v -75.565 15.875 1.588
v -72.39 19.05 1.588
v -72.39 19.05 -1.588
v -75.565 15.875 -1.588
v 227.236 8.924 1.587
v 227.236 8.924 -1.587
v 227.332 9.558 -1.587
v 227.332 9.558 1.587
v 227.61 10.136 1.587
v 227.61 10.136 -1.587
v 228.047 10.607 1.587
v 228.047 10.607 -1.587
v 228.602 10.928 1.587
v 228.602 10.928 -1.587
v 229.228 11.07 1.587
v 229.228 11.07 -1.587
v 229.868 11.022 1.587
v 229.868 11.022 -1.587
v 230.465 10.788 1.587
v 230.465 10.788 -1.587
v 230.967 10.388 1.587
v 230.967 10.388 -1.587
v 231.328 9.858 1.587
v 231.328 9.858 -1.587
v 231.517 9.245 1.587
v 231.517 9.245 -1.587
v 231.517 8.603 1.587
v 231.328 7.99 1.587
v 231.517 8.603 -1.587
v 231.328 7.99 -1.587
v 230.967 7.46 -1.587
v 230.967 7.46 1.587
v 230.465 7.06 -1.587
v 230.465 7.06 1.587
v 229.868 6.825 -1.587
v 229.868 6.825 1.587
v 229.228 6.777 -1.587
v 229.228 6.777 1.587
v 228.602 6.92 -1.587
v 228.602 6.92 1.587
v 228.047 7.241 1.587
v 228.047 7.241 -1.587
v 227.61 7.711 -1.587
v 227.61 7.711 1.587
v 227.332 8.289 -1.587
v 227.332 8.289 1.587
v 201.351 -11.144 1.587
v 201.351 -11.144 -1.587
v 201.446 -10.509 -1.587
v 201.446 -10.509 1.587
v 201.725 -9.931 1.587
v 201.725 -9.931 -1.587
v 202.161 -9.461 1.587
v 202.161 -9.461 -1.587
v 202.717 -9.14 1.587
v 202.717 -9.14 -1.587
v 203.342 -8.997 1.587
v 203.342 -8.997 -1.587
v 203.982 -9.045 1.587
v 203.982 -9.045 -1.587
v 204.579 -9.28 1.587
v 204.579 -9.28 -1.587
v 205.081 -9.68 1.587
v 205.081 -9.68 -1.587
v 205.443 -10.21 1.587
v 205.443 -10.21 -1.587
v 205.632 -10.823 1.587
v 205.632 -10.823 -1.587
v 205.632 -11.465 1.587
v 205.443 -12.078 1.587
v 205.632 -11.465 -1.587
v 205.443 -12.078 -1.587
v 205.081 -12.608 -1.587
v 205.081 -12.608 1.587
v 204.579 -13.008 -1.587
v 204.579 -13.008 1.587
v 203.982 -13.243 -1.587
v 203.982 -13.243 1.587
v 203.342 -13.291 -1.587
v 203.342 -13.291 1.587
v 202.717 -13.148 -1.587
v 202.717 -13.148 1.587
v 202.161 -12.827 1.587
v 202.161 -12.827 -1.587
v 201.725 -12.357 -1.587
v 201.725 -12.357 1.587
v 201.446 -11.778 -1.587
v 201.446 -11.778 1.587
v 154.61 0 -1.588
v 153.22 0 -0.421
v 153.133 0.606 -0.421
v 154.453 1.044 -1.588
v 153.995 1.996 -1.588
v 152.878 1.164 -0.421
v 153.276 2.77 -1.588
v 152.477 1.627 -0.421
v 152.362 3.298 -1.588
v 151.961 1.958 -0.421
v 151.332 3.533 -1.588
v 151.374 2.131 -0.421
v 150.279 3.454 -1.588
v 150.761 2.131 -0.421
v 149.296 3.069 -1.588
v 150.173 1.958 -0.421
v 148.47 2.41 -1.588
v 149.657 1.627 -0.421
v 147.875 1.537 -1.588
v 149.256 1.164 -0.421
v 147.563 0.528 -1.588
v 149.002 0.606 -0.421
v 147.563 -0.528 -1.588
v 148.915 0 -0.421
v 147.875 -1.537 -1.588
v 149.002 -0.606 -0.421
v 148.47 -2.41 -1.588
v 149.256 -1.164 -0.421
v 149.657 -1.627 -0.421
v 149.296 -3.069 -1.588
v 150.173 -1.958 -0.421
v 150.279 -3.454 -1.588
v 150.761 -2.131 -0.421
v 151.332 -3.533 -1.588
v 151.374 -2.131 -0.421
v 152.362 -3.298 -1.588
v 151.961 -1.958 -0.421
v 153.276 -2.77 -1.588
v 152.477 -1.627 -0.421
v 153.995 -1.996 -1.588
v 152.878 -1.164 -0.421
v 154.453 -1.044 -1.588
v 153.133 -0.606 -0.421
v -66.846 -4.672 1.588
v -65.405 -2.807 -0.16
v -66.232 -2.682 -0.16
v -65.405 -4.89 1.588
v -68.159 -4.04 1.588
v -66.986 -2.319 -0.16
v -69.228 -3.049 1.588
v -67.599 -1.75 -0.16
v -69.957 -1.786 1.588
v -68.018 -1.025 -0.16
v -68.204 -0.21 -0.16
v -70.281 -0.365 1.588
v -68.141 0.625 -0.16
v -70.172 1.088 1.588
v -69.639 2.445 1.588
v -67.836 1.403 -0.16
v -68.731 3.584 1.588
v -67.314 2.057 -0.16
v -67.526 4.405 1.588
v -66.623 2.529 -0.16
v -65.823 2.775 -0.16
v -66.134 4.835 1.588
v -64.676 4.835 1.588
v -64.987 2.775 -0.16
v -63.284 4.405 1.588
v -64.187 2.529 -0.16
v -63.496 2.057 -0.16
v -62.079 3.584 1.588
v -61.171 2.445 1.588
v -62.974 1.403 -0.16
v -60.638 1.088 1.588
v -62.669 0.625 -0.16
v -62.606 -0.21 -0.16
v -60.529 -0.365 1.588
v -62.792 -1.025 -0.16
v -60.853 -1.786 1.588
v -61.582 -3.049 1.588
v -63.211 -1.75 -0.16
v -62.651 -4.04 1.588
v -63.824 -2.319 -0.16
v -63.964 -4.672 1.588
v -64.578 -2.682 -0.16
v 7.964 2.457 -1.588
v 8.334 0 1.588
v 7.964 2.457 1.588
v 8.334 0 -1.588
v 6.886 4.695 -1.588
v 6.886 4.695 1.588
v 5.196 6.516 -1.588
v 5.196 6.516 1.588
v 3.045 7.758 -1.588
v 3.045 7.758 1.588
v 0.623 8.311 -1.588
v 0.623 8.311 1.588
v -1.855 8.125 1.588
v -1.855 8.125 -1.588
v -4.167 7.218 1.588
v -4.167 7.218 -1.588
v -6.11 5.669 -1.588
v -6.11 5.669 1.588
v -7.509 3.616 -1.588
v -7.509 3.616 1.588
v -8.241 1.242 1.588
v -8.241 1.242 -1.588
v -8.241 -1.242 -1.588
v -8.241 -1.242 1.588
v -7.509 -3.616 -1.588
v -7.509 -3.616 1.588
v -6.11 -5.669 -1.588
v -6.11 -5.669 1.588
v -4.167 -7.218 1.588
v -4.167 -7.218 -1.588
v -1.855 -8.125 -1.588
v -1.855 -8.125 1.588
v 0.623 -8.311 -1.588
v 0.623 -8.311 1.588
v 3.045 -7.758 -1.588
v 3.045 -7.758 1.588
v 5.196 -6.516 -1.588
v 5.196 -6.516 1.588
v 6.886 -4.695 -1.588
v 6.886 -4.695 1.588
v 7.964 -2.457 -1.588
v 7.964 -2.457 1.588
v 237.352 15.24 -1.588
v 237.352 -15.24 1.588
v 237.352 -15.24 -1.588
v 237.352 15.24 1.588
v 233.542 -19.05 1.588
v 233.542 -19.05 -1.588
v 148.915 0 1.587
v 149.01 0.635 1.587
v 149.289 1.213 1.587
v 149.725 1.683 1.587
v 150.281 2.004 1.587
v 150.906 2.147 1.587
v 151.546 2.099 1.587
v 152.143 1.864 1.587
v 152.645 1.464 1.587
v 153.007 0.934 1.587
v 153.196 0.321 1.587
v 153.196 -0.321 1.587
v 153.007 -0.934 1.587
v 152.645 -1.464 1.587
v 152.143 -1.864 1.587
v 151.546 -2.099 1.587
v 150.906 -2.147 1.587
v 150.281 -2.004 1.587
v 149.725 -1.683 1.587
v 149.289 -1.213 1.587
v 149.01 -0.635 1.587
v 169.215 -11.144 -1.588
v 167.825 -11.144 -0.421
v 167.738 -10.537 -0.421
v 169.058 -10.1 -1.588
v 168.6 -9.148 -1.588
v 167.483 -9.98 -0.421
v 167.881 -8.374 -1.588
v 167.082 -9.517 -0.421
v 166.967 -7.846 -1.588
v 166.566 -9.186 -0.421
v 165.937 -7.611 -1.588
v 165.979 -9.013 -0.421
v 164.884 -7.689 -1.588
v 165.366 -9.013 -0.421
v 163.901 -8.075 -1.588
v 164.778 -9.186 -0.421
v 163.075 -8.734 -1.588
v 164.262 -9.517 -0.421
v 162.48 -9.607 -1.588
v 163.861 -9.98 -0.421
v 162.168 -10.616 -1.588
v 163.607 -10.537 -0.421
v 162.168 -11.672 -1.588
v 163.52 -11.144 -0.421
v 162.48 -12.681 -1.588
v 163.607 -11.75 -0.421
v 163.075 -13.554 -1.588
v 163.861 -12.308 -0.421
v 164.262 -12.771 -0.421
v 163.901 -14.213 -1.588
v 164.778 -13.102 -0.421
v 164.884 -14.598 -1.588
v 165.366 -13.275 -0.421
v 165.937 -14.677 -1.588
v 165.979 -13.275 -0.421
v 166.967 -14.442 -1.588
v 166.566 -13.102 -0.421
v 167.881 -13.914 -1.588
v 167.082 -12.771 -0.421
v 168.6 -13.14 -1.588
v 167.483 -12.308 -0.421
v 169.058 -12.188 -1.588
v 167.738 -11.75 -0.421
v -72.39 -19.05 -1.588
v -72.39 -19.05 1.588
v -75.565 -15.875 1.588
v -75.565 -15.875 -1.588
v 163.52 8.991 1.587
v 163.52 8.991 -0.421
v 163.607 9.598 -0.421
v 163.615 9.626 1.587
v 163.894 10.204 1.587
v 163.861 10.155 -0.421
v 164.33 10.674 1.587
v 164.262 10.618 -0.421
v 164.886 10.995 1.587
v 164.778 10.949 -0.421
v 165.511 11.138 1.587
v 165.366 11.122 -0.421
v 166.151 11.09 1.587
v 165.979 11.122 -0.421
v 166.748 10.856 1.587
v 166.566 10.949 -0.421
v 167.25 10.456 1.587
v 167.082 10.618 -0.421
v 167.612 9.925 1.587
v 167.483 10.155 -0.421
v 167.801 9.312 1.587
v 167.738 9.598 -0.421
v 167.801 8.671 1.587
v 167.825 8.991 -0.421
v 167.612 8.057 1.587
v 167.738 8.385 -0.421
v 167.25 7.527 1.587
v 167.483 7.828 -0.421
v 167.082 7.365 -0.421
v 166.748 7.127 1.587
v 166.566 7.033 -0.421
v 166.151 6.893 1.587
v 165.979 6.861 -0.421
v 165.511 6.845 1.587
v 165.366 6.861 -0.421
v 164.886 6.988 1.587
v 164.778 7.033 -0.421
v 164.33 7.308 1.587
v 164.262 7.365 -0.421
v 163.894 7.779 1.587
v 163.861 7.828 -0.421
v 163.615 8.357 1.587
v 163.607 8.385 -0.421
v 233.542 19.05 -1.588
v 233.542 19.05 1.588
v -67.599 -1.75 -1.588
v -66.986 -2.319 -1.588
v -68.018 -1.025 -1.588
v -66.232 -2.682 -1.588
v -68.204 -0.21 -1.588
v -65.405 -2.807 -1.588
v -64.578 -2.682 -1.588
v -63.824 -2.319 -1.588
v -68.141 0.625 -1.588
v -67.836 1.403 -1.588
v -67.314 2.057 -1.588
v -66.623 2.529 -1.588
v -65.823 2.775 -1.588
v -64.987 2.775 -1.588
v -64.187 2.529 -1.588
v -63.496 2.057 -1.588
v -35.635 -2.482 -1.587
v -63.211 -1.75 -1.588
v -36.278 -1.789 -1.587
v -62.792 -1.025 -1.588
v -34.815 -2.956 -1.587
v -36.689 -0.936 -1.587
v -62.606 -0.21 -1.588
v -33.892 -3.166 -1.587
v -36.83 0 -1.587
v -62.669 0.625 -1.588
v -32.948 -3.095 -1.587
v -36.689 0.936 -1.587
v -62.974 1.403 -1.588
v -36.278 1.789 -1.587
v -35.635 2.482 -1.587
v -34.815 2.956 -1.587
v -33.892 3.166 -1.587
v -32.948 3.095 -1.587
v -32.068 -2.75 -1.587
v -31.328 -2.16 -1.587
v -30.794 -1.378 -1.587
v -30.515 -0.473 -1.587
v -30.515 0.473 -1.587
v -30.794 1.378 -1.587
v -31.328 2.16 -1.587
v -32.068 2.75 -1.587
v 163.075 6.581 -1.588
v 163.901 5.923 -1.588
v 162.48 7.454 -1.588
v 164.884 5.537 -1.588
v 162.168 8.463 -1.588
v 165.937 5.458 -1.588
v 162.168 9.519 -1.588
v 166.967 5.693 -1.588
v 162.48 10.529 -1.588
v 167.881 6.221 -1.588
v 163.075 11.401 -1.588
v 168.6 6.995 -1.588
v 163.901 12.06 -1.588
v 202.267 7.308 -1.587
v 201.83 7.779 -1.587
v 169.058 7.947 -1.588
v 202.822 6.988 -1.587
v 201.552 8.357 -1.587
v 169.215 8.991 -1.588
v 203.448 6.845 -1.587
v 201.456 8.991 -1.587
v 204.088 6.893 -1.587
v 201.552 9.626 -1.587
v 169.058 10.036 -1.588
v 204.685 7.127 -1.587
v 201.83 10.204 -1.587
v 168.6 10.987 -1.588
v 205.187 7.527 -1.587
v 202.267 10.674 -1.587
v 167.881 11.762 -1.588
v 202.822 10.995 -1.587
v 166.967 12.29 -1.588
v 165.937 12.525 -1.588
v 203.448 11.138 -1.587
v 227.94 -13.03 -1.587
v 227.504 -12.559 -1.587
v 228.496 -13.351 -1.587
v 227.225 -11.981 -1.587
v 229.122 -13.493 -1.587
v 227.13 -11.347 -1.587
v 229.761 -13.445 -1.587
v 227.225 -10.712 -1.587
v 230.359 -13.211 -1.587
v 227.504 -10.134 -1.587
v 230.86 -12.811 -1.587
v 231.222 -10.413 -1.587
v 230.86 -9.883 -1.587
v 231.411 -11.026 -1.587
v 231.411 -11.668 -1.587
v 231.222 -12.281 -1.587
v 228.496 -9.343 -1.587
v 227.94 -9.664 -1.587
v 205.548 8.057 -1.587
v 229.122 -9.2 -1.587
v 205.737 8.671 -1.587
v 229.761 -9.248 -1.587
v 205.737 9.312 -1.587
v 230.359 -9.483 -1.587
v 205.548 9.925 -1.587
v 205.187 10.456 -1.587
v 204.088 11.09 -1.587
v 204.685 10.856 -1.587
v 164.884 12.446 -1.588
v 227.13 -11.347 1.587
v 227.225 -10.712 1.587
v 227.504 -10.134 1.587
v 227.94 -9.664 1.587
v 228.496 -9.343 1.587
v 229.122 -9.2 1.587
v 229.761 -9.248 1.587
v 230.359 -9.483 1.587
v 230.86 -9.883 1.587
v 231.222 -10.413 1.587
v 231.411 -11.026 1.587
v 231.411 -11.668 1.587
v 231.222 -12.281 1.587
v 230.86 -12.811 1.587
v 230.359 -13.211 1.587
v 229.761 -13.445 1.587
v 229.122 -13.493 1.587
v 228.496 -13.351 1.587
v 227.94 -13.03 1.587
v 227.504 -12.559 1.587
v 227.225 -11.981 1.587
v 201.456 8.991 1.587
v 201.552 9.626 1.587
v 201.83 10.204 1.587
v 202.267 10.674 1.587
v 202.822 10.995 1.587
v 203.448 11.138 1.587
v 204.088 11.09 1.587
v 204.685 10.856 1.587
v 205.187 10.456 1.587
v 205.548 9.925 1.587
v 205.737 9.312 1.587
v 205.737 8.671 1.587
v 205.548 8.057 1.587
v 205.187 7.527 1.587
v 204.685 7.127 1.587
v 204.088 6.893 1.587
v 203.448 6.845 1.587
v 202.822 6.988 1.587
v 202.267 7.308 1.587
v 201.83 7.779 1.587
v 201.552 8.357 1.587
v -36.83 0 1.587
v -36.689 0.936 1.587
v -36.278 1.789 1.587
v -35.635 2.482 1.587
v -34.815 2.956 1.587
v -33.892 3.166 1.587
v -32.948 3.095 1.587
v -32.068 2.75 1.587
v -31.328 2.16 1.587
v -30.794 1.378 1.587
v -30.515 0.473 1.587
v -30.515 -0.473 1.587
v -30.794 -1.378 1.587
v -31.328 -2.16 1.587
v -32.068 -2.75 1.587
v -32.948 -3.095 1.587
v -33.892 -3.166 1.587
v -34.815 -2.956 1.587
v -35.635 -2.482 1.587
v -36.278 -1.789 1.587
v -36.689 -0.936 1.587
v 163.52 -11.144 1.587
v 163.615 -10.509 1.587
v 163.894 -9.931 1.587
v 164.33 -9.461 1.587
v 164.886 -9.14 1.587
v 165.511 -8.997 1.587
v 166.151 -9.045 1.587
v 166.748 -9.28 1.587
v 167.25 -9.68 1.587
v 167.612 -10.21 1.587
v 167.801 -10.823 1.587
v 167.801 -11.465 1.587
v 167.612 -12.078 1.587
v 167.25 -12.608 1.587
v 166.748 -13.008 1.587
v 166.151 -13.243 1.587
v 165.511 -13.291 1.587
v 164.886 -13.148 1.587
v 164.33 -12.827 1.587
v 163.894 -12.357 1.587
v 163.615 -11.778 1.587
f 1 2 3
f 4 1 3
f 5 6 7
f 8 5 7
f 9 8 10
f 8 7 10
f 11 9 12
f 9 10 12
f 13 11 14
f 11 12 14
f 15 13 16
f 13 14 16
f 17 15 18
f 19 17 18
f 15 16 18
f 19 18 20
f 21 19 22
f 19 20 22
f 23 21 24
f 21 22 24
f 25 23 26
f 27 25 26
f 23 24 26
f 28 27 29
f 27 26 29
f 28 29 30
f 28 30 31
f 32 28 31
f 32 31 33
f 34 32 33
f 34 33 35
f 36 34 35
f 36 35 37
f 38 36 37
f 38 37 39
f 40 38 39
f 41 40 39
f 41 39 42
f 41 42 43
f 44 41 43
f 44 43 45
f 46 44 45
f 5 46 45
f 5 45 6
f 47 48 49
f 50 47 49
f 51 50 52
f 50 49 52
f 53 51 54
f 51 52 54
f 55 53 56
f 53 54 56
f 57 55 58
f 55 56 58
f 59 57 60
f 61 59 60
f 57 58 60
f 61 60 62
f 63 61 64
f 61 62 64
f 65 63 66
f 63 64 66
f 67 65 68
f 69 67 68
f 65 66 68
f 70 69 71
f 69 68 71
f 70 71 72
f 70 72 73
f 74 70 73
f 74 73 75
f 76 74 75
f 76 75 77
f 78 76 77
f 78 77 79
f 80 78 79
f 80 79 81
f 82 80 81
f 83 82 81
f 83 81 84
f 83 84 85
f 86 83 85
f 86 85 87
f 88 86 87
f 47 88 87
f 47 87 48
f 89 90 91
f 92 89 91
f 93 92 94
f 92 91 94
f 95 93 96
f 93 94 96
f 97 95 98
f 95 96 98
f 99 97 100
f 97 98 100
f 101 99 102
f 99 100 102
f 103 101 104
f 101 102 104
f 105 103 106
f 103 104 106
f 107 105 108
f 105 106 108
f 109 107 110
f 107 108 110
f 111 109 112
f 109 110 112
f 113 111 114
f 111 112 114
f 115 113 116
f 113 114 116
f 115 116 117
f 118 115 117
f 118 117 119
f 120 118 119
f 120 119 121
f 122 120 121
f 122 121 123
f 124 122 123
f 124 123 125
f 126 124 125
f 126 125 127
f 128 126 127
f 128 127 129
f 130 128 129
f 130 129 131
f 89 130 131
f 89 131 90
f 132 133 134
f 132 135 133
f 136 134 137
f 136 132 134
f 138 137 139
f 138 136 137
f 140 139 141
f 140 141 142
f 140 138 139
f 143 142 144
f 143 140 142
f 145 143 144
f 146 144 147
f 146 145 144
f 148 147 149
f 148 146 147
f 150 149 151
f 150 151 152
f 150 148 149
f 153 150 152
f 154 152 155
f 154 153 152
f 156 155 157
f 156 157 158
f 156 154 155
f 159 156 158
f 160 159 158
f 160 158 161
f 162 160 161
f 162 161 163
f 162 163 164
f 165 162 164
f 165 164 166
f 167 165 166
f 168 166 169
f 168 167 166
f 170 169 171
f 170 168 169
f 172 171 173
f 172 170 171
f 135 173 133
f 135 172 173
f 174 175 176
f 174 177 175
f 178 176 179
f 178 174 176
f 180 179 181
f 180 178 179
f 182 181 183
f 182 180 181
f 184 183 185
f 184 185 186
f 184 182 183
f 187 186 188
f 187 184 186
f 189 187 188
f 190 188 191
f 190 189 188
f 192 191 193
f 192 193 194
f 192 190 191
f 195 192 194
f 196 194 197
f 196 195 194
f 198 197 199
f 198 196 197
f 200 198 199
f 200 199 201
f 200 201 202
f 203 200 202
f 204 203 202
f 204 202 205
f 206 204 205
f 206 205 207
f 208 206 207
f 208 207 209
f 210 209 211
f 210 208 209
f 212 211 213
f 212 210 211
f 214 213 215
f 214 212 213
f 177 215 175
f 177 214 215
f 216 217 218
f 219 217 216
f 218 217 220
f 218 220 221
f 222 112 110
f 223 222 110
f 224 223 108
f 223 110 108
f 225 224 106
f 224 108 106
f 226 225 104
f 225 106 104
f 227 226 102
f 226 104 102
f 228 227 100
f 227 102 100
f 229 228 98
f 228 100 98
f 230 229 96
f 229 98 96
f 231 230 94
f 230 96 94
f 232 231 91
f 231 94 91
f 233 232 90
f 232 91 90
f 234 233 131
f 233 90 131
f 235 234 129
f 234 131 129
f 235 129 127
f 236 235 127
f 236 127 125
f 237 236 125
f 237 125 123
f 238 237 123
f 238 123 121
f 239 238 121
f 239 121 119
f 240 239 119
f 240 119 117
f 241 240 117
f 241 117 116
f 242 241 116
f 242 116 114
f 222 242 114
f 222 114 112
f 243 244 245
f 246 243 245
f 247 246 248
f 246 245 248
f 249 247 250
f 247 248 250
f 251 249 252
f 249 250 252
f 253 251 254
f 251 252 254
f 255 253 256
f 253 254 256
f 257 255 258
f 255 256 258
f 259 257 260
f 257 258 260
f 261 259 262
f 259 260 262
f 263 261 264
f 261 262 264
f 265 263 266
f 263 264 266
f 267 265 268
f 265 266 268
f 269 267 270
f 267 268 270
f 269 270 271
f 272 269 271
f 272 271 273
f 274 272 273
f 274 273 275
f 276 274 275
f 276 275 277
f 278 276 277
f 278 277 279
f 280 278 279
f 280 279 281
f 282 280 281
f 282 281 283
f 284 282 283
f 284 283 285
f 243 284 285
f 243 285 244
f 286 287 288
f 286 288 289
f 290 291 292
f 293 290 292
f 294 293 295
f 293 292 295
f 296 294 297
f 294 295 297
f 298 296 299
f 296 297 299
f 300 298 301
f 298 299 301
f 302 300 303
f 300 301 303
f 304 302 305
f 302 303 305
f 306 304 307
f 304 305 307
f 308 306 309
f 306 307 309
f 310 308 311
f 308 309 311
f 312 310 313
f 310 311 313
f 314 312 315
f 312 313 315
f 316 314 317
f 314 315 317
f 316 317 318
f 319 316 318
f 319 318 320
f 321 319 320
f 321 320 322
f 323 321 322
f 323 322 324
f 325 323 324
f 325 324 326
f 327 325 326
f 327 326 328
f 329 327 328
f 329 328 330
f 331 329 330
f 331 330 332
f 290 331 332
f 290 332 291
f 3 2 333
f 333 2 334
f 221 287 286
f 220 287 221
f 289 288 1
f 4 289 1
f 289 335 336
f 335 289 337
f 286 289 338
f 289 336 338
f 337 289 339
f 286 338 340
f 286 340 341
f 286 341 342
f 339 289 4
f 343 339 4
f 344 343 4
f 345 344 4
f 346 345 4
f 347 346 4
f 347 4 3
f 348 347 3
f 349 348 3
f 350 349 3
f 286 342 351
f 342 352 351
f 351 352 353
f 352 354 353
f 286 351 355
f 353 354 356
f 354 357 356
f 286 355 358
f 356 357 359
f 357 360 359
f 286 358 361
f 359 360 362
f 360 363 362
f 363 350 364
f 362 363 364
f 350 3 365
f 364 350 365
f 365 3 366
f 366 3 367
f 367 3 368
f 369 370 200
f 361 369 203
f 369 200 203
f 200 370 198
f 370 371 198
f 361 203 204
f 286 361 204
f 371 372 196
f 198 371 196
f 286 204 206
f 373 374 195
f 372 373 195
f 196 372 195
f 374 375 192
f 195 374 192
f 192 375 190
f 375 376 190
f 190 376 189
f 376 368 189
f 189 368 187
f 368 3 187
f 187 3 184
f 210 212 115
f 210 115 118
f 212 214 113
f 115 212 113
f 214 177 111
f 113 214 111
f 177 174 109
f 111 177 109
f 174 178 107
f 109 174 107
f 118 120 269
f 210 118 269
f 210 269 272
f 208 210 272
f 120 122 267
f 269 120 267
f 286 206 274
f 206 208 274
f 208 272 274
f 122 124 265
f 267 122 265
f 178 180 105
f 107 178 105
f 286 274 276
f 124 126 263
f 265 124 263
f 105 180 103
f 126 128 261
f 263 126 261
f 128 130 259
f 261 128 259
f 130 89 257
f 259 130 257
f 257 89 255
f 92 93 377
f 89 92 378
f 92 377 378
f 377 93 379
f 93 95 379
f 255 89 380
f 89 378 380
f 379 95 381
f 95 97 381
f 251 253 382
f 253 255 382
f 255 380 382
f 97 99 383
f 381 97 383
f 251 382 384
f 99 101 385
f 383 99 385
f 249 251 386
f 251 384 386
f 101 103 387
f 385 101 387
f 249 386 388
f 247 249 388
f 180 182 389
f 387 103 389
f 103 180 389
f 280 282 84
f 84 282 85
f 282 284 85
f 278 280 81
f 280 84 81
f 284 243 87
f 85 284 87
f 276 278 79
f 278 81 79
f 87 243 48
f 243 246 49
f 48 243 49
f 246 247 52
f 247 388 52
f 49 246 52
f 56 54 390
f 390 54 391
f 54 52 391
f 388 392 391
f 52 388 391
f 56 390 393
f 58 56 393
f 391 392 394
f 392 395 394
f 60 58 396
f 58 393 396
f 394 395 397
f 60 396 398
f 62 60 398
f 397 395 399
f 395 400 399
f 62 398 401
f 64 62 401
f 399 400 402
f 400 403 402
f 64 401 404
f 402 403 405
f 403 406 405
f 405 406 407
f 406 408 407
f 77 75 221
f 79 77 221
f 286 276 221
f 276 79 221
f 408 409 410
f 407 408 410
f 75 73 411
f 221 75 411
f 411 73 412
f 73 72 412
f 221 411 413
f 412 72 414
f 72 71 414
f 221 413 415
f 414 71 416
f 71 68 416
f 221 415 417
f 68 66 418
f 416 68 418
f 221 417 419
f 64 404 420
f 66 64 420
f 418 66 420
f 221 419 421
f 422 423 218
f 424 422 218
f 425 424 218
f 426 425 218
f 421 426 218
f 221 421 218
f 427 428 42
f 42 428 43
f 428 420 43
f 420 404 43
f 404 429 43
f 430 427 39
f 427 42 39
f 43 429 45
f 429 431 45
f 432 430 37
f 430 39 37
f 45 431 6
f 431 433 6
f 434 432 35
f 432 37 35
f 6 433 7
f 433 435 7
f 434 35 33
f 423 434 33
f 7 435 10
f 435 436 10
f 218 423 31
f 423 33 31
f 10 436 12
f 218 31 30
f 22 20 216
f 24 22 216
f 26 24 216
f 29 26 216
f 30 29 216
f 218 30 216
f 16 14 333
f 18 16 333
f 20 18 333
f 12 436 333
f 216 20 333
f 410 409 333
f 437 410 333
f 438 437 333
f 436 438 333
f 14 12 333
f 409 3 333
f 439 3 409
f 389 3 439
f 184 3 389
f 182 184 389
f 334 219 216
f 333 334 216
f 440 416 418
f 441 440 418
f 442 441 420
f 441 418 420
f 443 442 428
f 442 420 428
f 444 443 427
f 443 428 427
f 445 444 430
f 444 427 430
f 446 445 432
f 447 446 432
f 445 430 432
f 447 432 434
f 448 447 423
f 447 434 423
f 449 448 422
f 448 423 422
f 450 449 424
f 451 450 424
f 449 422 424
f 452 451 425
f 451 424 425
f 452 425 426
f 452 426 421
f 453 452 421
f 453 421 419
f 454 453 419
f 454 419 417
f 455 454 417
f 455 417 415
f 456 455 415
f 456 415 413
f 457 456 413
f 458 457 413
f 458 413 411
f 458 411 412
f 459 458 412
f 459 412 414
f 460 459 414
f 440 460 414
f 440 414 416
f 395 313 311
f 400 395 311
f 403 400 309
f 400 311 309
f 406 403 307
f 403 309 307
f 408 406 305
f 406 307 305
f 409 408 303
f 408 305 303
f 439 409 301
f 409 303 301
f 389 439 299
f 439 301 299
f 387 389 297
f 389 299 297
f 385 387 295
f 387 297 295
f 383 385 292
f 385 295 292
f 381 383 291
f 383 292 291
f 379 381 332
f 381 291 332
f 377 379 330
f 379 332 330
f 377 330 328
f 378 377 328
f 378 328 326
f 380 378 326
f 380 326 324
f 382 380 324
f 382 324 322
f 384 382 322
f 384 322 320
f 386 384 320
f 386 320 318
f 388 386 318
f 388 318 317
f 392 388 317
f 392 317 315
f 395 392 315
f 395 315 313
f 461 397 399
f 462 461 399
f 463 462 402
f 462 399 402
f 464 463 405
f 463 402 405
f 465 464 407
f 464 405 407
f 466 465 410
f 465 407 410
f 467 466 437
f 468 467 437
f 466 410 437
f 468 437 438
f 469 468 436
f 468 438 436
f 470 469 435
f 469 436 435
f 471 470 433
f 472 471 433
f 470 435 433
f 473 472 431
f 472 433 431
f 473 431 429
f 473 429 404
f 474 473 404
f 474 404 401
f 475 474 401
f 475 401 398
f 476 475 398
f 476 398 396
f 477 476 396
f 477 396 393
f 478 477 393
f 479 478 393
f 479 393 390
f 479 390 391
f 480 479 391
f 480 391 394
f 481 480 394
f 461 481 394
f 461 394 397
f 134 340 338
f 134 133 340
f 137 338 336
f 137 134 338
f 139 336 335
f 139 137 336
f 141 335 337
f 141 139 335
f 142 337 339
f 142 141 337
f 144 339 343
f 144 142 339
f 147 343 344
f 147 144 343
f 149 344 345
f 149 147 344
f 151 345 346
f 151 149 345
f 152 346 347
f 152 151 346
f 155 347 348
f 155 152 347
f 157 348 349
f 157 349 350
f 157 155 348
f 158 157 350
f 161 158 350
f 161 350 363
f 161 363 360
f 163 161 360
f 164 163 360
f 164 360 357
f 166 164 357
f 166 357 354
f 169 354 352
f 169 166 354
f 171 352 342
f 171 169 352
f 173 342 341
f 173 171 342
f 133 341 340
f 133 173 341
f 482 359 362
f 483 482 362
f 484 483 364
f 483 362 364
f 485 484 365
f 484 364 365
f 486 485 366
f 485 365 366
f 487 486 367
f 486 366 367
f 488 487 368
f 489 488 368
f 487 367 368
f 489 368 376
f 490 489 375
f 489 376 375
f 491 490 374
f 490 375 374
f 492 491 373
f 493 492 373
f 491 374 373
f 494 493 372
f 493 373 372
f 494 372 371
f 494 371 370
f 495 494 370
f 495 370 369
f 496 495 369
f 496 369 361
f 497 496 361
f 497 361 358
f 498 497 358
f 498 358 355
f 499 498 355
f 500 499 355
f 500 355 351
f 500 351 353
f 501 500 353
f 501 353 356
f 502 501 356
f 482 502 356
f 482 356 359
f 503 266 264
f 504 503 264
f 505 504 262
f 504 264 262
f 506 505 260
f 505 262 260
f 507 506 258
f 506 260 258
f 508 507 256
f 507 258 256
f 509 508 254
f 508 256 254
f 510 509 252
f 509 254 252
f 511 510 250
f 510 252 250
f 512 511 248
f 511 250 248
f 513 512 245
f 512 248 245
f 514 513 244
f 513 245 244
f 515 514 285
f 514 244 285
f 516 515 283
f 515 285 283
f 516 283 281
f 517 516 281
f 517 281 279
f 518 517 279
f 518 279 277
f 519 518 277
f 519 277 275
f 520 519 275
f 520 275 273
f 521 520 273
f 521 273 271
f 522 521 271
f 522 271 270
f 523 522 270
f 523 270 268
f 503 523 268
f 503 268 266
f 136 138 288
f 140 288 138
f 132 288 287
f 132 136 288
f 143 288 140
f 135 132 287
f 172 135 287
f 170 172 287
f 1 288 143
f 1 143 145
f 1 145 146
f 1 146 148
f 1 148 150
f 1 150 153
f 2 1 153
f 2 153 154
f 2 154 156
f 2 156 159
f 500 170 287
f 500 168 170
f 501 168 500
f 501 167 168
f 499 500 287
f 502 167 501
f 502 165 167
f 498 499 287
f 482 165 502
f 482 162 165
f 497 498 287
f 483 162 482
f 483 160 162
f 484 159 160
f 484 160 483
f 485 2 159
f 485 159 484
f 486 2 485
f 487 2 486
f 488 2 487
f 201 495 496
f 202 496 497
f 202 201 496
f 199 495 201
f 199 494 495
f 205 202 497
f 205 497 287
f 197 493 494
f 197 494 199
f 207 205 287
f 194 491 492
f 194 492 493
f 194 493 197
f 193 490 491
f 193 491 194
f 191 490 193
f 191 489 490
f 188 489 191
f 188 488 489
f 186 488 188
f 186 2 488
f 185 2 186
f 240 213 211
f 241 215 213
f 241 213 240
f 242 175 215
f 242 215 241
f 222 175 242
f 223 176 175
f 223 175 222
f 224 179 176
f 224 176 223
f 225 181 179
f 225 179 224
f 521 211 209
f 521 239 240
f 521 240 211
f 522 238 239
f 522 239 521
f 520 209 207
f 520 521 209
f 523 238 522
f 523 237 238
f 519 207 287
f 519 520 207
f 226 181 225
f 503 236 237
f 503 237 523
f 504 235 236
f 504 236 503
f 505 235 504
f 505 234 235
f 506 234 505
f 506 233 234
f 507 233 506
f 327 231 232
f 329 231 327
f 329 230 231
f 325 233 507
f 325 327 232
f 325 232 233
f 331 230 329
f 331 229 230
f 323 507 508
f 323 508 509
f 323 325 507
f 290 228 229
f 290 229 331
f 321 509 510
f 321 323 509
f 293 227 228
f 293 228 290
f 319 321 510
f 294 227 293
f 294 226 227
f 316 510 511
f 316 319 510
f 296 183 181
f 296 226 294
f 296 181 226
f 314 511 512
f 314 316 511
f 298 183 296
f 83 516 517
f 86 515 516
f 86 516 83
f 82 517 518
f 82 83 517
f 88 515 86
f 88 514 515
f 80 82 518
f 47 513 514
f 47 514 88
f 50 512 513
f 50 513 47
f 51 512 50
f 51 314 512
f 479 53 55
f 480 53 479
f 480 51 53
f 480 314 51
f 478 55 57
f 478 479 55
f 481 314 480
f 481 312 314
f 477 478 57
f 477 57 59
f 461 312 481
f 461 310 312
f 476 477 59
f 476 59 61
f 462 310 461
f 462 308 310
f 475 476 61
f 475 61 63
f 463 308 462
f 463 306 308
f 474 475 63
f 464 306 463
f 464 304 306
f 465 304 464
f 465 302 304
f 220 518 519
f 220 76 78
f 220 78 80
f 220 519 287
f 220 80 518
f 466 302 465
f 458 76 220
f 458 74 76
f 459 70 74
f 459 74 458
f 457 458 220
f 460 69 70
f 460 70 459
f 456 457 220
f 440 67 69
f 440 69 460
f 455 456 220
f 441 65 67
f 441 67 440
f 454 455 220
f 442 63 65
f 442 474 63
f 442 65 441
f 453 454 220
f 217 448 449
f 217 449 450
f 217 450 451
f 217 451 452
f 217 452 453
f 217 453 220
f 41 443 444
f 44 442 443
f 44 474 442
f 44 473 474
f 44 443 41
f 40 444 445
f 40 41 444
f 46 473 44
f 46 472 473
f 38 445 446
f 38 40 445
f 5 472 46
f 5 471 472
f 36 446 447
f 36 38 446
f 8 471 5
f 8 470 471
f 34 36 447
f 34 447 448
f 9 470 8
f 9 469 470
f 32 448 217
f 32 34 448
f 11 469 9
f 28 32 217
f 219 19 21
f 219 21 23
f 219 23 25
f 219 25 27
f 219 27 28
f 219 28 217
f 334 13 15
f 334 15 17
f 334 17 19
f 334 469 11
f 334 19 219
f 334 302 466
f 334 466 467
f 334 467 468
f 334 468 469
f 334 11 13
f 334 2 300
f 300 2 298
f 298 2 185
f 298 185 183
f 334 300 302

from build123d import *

# Parameters (mm, degrees)
SKETCH1_R                                         = 8.334375
BOSS_EXTRUDE1_DEPTH                               = 1.5875
F_6_CLEARANCE_HOLE3_D                             = 4.3053
CUT_EXTRUDE1_DEPTH                                = 4.175
CHAMFER1_SIZE                                     = 3.81
SKETCH10_W                                        = 50.8
SKETCH10_H                                        = 38.1
BOSS_EXTRUDE2_DEPTH                               = 3.175
CHAMFER2_SIZE                                     = 3.175
F_1_4_0_25_DIAMETER_HOLE1_D                       = 6.35
CSK_FOR_6_FLAT_HEAD_MACHINE_SCREW_100_D           = 4.3053
CSK_FOR_6_FLAT_HEAD_MACHINE_SCREW_100_CSINK_D     = 7.0866
CSK_FOR_6_FLAT_HEAD_MACHINE_SCREW_100_CSINK_ANGLE = 100


with BuildPart() as part:
    # Sketch1 → Boss-Extrude1 (new body, symmetric)
    with BuildSketch(Plane.XY):
        Polygon((0, 19.05), (-28.575, 19.05), (-28.575, -19.05), (0, -19.05), (247.281942035, -19.05), (254, 19.05), align=None)
        Circle(SKETCH1_R, mode=Mode.SUBTRACT)
    extrude(amount=BOSS_EXTRUDE1_DEPTH, both=True)

    # #6 Clearance Hole3 (through all)
    with Locations(Plane.XY.offset(1.5875)):
        with Locations((229.388701471, 8.923791784), (229.282371239, -11.346798968), (203.503161764, -11.143926969), (203.608782335, 8.991375351), (165.672159691, 8.991375351), (165.672159691, -11.143926969), (151.067159691, 0)):
            Hole(F_6_CLEARANCE_HOLE3_D / 2)

    # Sketch9 → Cut-Extrude1 (cut, through all)
    with BuildSketch(Plane.XY.offset(1.5875)):
        Polygon((254, 19.05), (247.281942035, -19.05), (237.352085197, -19.05), (237.352085197, 19.05), align=None)
    extrude(amount=-CUT_EXTRUDE1_DEPTH, mode=Mode.SUBTRACT)

    # Chamfer1
    chamfer1_edges = [part.edges().sort_by_distance(p)[0] for p in [
        (-28.575, -19.05, 0),
        (-28.575, 19.05, 0),
        (237.352085197, 19.05, 0),
        (237.352085197, -19.05, 0),
    ]]
    chamfer(chamfer1_edges, length=CHAMFER1_SIZE)

    # Sketch10 → Boss-Extrude2 (add, through all)
    with BuildSketch(Plane.XY.offset(1.5875)):
        with Locations((-50.165, 0)):
            Rectangle(SKETCH10_W, SKETCH10_H)
    extrude(amount=-BOSS_EXTRUDE2_DEPTH)

    # Chamfer2
    chamfer2_edges = [part.edges().sort_by_distance(p)[0] for p in [
        (-75.565, -19.05, 0),
        (-75.565, 19.05, 0),
    ]]
    chamfer(chamfer2_edges, length=CHAMFER2_SIZE)

    # Sketch12 → CSK for #10 Flat Head Machine Screw (100)1 (revolve, cut)
    with BuildSketch(Plane(origin=(-65.405, 0, 1.5875), x_dir=(0, -1, 0), z_dir=(1, 0, 0))):
        Polygon((0, 0), (0, 3.175), (2.8067, 3.175), (2.8067, 1.747676712), (4.8895, 0), align=None)
    revolve(axis=Axis((-65.405, 0, 7.9375), (0, 0, -1)), mode=Mode.SUBTRACT)

    # 1/4 (0.25) Diameter Hole1 (through all)
    with Locations(Plane.XY.offset(1.5875)):
        with Locations((-33.655, 0)):
            Hole(F_1_4_0_25_DIAMETER_HOLE1_D / 2)

    # CSK for #6 Flat Head Machine Screw (100)1 (through all)
    with Locations(Plane(origin=(0, 0, -1.5875), x_dir=(-1, 0, 0), z_dir=(0, 0, -1))):
        with Locations((-151.067159691, 0), (-165.672159691, -11.143926969), (-165.672159691, 8.991375351)):
            CounterSinkHole(CSK_FOR_6_FLAT_HEAD_MACHINE_SCREW_100_D / 2, CSK_FOR_6_FLAT_HEAD_MACHINE_SCREW_100_CSINK_D / 2, counter_sink_angle=CSK_FOR_6_FLAT_HEAD_MACHINE_SCREW_100_CSINK_ANGLE)


solid = part.part
